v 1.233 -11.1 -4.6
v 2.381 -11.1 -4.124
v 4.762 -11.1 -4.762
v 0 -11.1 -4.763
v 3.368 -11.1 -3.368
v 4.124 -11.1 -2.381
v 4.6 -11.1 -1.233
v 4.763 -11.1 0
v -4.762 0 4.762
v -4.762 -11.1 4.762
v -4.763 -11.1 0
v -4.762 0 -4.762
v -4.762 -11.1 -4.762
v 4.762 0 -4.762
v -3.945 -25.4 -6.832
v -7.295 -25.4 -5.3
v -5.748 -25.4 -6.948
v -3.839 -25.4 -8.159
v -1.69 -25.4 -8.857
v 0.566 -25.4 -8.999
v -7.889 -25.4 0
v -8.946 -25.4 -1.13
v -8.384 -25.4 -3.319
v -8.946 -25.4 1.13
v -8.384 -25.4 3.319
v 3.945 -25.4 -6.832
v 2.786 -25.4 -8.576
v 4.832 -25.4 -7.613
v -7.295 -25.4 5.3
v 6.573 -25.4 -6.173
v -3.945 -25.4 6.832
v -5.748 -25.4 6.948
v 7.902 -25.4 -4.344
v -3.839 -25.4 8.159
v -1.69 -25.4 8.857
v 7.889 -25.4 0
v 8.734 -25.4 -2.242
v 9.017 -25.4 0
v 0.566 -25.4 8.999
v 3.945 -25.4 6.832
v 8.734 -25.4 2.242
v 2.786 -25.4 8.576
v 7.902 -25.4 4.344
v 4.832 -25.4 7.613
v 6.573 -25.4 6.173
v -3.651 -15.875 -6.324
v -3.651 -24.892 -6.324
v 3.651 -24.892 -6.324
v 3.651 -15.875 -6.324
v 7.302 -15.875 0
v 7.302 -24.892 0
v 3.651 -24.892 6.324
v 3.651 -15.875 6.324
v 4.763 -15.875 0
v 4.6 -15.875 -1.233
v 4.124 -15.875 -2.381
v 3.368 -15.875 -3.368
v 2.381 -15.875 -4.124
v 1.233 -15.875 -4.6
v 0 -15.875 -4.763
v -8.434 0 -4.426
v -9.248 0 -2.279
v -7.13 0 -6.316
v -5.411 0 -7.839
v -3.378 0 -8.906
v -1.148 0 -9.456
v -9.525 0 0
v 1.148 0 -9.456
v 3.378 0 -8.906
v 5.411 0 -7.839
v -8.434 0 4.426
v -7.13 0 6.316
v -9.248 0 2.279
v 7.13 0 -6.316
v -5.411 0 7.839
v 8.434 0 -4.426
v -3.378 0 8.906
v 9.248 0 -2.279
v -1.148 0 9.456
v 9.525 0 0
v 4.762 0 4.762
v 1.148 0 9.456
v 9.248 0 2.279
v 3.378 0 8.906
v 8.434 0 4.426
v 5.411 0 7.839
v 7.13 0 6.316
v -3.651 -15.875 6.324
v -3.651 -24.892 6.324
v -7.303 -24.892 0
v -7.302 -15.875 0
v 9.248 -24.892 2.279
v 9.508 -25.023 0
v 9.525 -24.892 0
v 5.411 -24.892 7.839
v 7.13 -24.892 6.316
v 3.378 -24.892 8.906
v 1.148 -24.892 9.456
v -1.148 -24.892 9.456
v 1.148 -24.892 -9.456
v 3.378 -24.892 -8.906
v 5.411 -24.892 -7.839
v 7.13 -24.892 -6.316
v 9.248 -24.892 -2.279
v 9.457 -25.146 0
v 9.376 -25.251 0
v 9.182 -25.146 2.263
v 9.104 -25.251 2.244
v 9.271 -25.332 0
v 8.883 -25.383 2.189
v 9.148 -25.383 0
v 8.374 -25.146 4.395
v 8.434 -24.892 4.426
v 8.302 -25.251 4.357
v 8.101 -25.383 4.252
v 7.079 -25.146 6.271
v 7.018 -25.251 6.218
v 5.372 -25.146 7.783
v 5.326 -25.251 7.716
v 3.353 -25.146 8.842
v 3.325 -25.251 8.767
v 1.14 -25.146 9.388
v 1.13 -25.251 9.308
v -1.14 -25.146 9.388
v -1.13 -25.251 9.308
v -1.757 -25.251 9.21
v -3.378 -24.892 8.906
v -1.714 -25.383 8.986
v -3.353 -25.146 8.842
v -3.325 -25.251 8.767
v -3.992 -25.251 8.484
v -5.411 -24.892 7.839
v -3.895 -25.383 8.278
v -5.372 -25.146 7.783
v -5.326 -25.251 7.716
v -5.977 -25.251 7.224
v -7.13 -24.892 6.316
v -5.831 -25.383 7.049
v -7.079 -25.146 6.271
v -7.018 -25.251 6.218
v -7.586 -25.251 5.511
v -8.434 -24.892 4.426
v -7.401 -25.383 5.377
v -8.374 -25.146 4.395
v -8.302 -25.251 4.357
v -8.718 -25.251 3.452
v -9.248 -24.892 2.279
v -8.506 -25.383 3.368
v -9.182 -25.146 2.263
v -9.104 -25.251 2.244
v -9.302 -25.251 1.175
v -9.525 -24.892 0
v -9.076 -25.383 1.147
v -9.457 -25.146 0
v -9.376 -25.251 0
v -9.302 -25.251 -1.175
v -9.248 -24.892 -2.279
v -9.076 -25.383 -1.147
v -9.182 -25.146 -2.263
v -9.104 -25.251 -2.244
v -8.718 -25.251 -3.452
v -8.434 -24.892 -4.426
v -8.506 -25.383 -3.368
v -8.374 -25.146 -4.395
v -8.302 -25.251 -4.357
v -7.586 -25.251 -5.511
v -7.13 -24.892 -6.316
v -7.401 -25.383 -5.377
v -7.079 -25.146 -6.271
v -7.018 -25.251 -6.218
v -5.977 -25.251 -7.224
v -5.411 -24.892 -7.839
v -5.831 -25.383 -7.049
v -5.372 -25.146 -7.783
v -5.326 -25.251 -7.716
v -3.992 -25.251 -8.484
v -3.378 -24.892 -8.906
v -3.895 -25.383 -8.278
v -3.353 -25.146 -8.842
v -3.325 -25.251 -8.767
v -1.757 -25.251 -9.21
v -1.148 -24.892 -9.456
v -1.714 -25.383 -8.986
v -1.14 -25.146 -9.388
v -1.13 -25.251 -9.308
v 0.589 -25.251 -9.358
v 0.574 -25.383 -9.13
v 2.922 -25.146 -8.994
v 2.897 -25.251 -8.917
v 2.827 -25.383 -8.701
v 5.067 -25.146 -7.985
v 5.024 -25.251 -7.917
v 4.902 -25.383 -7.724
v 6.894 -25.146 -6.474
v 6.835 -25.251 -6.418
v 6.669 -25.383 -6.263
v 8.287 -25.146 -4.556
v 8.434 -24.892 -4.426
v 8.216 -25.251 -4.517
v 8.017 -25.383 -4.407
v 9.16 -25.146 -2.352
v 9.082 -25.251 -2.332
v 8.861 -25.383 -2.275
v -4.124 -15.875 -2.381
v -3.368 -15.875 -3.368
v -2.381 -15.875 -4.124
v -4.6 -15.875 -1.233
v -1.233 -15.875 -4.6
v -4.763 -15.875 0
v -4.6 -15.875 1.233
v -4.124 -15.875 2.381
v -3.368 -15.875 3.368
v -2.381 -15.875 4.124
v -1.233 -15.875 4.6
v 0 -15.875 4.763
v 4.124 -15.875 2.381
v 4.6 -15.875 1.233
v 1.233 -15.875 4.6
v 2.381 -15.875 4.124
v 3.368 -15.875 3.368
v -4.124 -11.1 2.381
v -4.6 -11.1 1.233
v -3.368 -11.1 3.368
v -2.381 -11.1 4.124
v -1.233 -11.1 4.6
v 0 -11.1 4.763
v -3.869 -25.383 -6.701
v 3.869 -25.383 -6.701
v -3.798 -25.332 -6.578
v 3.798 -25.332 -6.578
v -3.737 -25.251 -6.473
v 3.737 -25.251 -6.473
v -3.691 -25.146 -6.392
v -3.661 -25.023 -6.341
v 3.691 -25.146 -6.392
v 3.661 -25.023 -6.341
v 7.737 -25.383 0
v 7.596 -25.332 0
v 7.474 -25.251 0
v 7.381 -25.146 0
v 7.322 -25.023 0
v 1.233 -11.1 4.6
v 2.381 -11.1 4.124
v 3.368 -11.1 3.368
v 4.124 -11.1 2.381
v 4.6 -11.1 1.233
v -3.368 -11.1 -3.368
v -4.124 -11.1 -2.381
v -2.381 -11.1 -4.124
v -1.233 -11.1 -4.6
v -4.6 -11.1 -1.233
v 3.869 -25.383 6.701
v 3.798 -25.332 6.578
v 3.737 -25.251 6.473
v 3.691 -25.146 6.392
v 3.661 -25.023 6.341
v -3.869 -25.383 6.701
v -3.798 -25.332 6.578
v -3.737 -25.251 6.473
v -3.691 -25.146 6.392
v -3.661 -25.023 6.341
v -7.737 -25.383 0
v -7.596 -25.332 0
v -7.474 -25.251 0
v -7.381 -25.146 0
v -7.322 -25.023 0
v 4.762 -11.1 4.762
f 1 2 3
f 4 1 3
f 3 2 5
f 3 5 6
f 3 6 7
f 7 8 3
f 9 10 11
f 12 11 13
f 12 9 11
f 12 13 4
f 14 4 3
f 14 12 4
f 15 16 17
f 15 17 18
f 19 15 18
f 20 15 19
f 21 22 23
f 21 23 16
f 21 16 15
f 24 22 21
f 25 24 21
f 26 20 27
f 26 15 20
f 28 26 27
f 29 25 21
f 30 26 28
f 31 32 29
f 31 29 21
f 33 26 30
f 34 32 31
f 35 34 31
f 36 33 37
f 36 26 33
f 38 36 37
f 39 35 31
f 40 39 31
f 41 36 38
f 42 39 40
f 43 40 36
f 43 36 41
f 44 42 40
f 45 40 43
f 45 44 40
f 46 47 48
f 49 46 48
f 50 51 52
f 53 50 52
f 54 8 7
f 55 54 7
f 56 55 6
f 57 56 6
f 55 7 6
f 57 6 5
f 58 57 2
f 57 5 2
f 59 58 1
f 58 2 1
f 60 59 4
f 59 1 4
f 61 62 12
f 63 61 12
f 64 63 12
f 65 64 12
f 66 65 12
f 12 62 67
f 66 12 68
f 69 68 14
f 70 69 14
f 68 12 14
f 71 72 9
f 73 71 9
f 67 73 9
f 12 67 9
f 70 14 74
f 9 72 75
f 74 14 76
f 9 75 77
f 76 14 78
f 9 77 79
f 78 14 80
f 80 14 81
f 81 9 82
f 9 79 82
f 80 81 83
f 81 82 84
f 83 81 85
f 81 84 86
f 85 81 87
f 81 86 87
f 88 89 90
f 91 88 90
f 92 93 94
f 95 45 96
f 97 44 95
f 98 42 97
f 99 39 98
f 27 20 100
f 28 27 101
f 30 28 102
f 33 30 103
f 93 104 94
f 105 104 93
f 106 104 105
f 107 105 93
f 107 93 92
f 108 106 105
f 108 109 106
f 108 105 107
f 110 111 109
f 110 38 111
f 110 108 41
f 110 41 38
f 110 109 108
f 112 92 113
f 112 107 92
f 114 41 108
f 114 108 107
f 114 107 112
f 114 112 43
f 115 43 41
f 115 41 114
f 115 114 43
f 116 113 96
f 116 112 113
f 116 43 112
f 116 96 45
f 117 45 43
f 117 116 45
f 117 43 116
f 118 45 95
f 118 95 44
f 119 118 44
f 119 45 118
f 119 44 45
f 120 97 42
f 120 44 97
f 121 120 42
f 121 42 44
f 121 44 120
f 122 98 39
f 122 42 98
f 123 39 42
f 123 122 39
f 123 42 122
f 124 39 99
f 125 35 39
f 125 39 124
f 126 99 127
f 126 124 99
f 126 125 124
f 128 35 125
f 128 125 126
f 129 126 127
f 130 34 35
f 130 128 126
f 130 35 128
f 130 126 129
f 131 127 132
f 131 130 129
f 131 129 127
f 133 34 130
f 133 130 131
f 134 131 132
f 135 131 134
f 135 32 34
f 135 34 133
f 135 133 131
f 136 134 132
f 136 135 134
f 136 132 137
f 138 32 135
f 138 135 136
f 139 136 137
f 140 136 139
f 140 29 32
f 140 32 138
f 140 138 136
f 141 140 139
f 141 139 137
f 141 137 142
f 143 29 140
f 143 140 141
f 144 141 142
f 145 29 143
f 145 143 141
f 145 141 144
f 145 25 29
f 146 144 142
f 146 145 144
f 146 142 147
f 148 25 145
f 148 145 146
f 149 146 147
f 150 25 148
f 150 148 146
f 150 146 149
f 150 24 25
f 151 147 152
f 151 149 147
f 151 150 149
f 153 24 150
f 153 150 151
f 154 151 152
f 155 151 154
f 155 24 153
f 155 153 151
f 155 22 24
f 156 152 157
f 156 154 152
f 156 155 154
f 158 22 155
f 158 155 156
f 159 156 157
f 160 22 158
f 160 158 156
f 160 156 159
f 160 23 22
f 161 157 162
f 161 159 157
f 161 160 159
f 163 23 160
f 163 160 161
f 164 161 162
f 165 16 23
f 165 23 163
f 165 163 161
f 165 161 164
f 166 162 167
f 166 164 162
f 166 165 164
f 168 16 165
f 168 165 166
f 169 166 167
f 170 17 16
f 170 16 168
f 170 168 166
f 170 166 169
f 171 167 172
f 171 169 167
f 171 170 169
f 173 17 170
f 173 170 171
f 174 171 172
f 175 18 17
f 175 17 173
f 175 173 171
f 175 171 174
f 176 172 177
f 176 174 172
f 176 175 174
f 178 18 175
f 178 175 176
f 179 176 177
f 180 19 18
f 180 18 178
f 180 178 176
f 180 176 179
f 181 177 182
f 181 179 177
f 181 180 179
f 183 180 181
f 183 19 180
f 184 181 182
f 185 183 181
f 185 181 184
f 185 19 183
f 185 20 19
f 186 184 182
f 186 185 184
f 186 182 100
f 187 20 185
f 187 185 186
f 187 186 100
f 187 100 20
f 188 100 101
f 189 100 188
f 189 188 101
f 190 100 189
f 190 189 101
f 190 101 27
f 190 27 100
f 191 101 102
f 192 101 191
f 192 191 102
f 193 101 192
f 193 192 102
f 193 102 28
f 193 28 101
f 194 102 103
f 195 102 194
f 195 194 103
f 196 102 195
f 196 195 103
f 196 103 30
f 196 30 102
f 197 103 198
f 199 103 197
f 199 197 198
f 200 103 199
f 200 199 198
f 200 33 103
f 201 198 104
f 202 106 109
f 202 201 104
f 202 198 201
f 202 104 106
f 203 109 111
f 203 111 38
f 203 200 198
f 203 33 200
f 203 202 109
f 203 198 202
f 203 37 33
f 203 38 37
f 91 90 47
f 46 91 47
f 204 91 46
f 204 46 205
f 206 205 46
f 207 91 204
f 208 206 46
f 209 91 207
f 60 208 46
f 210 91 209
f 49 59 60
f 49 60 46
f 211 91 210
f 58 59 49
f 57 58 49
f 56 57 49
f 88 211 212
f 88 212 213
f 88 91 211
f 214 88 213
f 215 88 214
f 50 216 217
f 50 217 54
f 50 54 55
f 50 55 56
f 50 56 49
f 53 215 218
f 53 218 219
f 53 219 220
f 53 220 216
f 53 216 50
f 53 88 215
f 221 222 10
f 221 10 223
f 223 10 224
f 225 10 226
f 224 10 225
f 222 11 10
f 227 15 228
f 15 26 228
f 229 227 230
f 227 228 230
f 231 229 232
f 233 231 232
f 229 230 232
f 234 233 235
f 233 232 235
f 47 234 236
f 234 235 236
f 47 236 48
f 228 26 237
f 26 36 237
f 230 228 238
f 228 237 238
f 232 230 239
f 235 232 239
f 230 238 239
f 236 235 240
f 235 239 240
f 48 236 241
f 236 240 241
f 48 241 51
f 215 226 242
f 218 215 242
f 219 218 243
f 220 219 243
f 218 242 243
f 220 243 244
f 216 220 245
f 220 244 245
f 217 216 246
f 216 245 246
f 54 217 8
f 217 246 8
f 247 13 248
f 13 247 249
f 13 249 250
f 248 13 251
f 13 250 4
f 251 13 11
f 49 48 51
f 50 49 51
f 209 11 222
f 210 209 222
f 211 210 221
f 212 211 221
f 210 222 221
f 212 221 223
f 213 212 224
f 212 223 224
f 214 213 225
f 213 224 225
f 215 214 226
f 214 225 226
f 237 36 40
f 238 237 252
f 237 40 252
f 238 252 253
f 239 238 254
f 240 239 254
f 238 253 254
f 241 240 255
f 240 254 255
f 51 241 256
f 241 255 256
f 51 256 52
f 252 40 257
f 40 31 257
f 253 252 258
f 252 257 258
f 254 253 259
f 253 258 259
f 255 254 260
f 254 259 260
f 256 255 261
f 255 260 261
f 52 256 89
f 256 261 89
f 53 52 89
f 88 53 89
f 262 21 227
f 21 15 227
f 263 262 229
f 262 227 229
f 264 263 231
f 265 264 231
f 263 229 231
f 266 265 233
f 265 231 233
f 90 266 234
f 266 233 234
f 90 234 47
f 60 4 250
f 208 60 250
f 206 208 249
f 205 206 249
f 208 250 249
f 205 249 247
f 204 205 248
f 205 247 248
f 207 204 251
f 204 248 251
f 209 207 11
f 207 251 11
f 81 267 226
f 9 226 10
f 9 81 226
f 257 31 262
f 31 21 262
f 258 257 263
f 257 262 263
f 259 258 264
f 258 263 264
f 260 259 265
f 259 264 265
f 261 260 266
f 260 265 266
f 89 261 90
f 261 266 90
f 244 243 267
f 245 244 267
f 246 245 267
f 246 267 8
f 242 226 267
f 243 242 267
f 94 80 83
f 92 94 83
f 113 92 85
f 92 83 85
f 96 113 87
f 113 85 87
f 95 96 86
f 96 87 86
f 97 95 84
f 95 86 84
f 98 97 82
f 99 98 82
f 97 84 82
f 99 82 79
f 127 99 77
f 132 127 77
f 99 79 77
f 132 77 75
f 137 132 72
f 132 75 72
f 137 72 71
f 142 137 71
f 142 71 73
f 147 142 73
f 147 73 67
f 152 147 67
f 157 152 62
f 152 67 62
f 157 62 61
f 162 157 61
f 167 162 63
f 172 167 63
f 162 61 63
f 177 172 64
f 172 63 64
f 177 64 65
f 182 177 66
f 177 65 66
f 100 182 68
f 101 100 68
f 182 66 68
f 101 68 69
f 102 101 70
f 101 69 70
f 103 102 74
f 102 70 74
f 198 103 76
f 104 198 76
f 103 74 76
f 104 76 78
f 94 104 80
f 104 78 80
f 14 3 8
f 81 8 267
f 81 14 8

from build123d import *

# Parameters (mm, degrees)
F0_R      = 9.525
F1_DEPTH  = 25.4
F3_DEPTH  = 50
F5_DEPTH  = 25.401
F6_DEPTH  = 9.398
F7_DEPTH  = 12.7
F8_DEPTH  = 11.0998
F10_DEPTH = 9.525
F11_R     = 0.508


# Not quite as in the source:
# - an extrude ends at something that could not be found from the text; its depth is read off the source's solid


with BuildPart() as f1:
    # F0 (on Front) → F1 (new body)
    with BuildSketch(Plane.XZ):
        Circle(F0_R)
    extrude(amount=F1_DEPTH)

    # F2 (on Front) → F3 (cut, through all)
    with BuildSketch(Plane.XZ):
        with BuildLine():
            ThreePointArc((4.7625, 0), (3.3675960454, 3.3675960454), (0, 4.7625))
            ThreePointArc((0, 4.7625), (-3.3675960454, 3.3675960454), (-4.7625, 0))
            ThreePointArc((-4.7625, 0), (-3.3675960454, -3.3675960454), (0, -4.7625))
            ThreePointArc((0, -4.7625), (3.3675960454, -3.3675960454), (4.7625, 0))
        make_face()
    extrude(amount=-F3_DEPTH, mode=Mode.SUBTRACT)

    # F4 (on face) → F5 (cut, through all)
    with BuildSketch(Plane(origin=(0, 0, 0), x_dir=(-1, 0, 0), z_dir=(0, 1, 0))):
        with BuildLine():
            ThreePointArc((-4.7625, 0), (-3.3675960454, -3.3675960454), (0, -4.7625))
            ThreePointArc((0, -4.7625), (3.3675960454, -3.3675960454), (4.7625, 0))
            ThreePointArc((4.7625, 0), (3.3675960454, 3.3675960454), (0, 4.7625))
            ThreePointArc((0, 4.7625), (-3.3675960454, 3.3675960454), (-4.7625, 0))
        make_face()
    extrude(amount=-F5_DEPTH, mode=Mode.SUBTRACT)

    # F2 (on Front) → F6 (cut)
    with BuildSketch(Plane.XZ):
        with BuildLine():
            Line((4.7625, 0), (4.7625, 4.7625))
            Line((4.7625, 4.7625), (0, 4.7625))
            ThreePointArc((0, 4.7625), (3.3675960454, 3.3675960454), (4.7625, 0))
        make_face()
        with BuildLine():
            ThreePointArc((-4.7625, 0), (-3.3675960454, 3.3675960454), (0, 4.7625))
            Line((0, 4.7625), (-4.7625, 4.7625))
            Line((-4.7625, 4.7625), (-4.7625, 0))
        make_face()
        with BuildLine():
            ThreePointArc((4.7625, 0), (3.3675960454, 3.3675960454), (0, 4.7625))
            ThreePointArc((0, 4.7625), (-3.3675960454, 3.3675960454), (-4.7625, 0))
            ThreePointArc((-4.7625, 0), (-3.3675960454, -3.3675960454), (0, -4.7625))
            ThreePointArc((0, -4.7625), (3.3675960454, -3.3675960454), (4.7625, 0))
        make_face()
        with BuildLine():
            Line((4.7625, -4.7625), (4.7625, 0))
            ThreePointArc((4.7625, 0), (3.3675960454, -3.3675960454), (0, -4.7625))
            Line((0, -4.7625), (4.7625, -4.7625))
        make_face()
        with BuildLine():
            ThreePointArc((0, -4.7625), (-3.3675960454, -3.3675960454), (-4.7625, 0))
            Line((-4.7625, 0), (-4.7625, -4.7625))
            Line((-4.7625, -4.7625), (0, -4.7625))
        make_face()
    extrude(amount=-F6_DEPTH, mode=Mode.SUBTRACT)

    # F2 (on Front) → F7 (cut)
    with BuildSketch(Plane.XZ):
        with BuildLine():
            Line((4.7625, 0), (4.7625, 4.7625))
            Line((4.7625, 4.7625), (0, 4.7625))
            ThreePointArc((0, 4.7625), (3.3675960454, 3.3675960454), (4.7625, 0))
        make_face()
        with BuildLine():
            ThreePointArc((-4.7625, 0), (-3.3675960454, 3.3675960454), (0, 4.7625))
            Line((0, 4.7625), (-4.7625, 4.7625))
            Line((-4.7625, 4.7625), (-4.7625, 0))
        make_face()
        with BuildLine():
            ThreePointArc((4.7625, 0), (3.3675960454, 3.3675960454), (0, 4.7625))
            ThreePointArc((0, 4.7625), (-3.3675960454, 3.3675960454), (-4.7625, 0))
            ThreePointArc((-4.7625, 0), (-3.3675960454, -3.3675960454), (0, -4.7625))
            ThreePointArc((0, -4.7625), (3.3675960454, -3.3675960454), (4.7625, 0))
        make_face()
        with BuildLine():
            Line((4.7625, -4.7625), (4.7625, 0))
            ThreePointArc((4.7625, 0), (3.3675960454, -3.3675960454), (0, -4.7625))
            Line((0, -4.7625), (4.7625, -4.7625))
        make_face()
        with BuildLine():
            ThreePointArc((0, -4.7625), (-3.3675960454, -3.3675960454), (-4.7625, 0))
            Line((-4.7625, 0), (-4.7625, -4.7625))
            Line((-4.7625, -4.7625), (0, -4.7625))
        make_face()
    extrude(amount=-F7_DEPTH, mode=Mode.SUBTRACT)

    # F2 (on Front) → F8 (cut)
    with BuildSketch(Plane.XZ):
        with BuildLine():
            Line((4.7625, 0), (4.7625, 4.7625))
            Line((4.7625, 4.7625), (0, 4.7625))
            ThreePointArc((0, 4.7625), (3.3675960454, 3.3675960454), (4.7625, 0))
        make_face()
        with BuildLine():
            ThreePointArc((-4.7625, 0), (-3.3675960454, 3.3675960454), (0, 4.7625))
            Line((0, 4.7625), (-4.7625, 4.7625))
            Line((-4.7625, 4.7625), (-4.7625, 0))
        make_face()
        with BuildLine():
            ThreePointArc((4.7625, 0), (3.3675960454, 3.3675960454), (0, 4.7625))
            ThreePointArc((0, 4.7625), (-3.3675960454, 3.3675960454), (-4.7625, 0))
            ThreePointArc((-4.7625, 0), (-3.3675960454, -3.3675960454), (0, -4.7625))
            ThreePointArc((0, -4.7625), (3.3675960454, -3.3675960454), (4.7625, 0))
        make_face()
        with BuildLine():
            Line((4.7625, -4.7625), (4.7625, 0))
            ThreePointArc((4.7625, 0), (3.3675960454, -3.3675960454), (0, -4.7625))
            Line((0, -4.7625), (4.7625, -4.7625))
        make_face()
        with BuildLine():
            ThreePointArc((0, -4.7625), (-3.3675960454, -3.3675960454), (-4.7625, 0))
            Line((-4.7625, 0), (-4.7625, -4.7625))
            Line((-4.7625, -4.7625), (0, -4.7625))
        make_face()
    extrude(amount=F8_DEPTH, mode=Mode.SUBTRACT)

    # F9 (on face) → F10 (cut)
    with BuildSketch(Plane.XZ.offset(25.4)):
        Polygon((3.65125, 6.3241505111), (-3.65125, 6.3241505111), (-7.3025, 0), (-3.65125, -6.3241505111), (3.65125, -6.3241505111), (7.3025, 0), align=None)
    extrude(amount=-F10_DEPTH, mode=Mode.SUBTRACT)

    # F11
    f11_edges = [f1.edges().sort_by_distance(p)[0] for p in [
        (-9.525, -25.4, 0),
        (-5.476875, -25.4, 3.162075),
        (0, -25.4, 6.324151),
        (5.476875, -25.4, 3.162075),
        (-5.476875, -25.4, -3.162075),
        (0, -25.4, -6.324151),
        (5.476875, -25.4, -3.162075),
    ]]
    fillet(f11_edges, radius=F11_R)


solid = f1.part
